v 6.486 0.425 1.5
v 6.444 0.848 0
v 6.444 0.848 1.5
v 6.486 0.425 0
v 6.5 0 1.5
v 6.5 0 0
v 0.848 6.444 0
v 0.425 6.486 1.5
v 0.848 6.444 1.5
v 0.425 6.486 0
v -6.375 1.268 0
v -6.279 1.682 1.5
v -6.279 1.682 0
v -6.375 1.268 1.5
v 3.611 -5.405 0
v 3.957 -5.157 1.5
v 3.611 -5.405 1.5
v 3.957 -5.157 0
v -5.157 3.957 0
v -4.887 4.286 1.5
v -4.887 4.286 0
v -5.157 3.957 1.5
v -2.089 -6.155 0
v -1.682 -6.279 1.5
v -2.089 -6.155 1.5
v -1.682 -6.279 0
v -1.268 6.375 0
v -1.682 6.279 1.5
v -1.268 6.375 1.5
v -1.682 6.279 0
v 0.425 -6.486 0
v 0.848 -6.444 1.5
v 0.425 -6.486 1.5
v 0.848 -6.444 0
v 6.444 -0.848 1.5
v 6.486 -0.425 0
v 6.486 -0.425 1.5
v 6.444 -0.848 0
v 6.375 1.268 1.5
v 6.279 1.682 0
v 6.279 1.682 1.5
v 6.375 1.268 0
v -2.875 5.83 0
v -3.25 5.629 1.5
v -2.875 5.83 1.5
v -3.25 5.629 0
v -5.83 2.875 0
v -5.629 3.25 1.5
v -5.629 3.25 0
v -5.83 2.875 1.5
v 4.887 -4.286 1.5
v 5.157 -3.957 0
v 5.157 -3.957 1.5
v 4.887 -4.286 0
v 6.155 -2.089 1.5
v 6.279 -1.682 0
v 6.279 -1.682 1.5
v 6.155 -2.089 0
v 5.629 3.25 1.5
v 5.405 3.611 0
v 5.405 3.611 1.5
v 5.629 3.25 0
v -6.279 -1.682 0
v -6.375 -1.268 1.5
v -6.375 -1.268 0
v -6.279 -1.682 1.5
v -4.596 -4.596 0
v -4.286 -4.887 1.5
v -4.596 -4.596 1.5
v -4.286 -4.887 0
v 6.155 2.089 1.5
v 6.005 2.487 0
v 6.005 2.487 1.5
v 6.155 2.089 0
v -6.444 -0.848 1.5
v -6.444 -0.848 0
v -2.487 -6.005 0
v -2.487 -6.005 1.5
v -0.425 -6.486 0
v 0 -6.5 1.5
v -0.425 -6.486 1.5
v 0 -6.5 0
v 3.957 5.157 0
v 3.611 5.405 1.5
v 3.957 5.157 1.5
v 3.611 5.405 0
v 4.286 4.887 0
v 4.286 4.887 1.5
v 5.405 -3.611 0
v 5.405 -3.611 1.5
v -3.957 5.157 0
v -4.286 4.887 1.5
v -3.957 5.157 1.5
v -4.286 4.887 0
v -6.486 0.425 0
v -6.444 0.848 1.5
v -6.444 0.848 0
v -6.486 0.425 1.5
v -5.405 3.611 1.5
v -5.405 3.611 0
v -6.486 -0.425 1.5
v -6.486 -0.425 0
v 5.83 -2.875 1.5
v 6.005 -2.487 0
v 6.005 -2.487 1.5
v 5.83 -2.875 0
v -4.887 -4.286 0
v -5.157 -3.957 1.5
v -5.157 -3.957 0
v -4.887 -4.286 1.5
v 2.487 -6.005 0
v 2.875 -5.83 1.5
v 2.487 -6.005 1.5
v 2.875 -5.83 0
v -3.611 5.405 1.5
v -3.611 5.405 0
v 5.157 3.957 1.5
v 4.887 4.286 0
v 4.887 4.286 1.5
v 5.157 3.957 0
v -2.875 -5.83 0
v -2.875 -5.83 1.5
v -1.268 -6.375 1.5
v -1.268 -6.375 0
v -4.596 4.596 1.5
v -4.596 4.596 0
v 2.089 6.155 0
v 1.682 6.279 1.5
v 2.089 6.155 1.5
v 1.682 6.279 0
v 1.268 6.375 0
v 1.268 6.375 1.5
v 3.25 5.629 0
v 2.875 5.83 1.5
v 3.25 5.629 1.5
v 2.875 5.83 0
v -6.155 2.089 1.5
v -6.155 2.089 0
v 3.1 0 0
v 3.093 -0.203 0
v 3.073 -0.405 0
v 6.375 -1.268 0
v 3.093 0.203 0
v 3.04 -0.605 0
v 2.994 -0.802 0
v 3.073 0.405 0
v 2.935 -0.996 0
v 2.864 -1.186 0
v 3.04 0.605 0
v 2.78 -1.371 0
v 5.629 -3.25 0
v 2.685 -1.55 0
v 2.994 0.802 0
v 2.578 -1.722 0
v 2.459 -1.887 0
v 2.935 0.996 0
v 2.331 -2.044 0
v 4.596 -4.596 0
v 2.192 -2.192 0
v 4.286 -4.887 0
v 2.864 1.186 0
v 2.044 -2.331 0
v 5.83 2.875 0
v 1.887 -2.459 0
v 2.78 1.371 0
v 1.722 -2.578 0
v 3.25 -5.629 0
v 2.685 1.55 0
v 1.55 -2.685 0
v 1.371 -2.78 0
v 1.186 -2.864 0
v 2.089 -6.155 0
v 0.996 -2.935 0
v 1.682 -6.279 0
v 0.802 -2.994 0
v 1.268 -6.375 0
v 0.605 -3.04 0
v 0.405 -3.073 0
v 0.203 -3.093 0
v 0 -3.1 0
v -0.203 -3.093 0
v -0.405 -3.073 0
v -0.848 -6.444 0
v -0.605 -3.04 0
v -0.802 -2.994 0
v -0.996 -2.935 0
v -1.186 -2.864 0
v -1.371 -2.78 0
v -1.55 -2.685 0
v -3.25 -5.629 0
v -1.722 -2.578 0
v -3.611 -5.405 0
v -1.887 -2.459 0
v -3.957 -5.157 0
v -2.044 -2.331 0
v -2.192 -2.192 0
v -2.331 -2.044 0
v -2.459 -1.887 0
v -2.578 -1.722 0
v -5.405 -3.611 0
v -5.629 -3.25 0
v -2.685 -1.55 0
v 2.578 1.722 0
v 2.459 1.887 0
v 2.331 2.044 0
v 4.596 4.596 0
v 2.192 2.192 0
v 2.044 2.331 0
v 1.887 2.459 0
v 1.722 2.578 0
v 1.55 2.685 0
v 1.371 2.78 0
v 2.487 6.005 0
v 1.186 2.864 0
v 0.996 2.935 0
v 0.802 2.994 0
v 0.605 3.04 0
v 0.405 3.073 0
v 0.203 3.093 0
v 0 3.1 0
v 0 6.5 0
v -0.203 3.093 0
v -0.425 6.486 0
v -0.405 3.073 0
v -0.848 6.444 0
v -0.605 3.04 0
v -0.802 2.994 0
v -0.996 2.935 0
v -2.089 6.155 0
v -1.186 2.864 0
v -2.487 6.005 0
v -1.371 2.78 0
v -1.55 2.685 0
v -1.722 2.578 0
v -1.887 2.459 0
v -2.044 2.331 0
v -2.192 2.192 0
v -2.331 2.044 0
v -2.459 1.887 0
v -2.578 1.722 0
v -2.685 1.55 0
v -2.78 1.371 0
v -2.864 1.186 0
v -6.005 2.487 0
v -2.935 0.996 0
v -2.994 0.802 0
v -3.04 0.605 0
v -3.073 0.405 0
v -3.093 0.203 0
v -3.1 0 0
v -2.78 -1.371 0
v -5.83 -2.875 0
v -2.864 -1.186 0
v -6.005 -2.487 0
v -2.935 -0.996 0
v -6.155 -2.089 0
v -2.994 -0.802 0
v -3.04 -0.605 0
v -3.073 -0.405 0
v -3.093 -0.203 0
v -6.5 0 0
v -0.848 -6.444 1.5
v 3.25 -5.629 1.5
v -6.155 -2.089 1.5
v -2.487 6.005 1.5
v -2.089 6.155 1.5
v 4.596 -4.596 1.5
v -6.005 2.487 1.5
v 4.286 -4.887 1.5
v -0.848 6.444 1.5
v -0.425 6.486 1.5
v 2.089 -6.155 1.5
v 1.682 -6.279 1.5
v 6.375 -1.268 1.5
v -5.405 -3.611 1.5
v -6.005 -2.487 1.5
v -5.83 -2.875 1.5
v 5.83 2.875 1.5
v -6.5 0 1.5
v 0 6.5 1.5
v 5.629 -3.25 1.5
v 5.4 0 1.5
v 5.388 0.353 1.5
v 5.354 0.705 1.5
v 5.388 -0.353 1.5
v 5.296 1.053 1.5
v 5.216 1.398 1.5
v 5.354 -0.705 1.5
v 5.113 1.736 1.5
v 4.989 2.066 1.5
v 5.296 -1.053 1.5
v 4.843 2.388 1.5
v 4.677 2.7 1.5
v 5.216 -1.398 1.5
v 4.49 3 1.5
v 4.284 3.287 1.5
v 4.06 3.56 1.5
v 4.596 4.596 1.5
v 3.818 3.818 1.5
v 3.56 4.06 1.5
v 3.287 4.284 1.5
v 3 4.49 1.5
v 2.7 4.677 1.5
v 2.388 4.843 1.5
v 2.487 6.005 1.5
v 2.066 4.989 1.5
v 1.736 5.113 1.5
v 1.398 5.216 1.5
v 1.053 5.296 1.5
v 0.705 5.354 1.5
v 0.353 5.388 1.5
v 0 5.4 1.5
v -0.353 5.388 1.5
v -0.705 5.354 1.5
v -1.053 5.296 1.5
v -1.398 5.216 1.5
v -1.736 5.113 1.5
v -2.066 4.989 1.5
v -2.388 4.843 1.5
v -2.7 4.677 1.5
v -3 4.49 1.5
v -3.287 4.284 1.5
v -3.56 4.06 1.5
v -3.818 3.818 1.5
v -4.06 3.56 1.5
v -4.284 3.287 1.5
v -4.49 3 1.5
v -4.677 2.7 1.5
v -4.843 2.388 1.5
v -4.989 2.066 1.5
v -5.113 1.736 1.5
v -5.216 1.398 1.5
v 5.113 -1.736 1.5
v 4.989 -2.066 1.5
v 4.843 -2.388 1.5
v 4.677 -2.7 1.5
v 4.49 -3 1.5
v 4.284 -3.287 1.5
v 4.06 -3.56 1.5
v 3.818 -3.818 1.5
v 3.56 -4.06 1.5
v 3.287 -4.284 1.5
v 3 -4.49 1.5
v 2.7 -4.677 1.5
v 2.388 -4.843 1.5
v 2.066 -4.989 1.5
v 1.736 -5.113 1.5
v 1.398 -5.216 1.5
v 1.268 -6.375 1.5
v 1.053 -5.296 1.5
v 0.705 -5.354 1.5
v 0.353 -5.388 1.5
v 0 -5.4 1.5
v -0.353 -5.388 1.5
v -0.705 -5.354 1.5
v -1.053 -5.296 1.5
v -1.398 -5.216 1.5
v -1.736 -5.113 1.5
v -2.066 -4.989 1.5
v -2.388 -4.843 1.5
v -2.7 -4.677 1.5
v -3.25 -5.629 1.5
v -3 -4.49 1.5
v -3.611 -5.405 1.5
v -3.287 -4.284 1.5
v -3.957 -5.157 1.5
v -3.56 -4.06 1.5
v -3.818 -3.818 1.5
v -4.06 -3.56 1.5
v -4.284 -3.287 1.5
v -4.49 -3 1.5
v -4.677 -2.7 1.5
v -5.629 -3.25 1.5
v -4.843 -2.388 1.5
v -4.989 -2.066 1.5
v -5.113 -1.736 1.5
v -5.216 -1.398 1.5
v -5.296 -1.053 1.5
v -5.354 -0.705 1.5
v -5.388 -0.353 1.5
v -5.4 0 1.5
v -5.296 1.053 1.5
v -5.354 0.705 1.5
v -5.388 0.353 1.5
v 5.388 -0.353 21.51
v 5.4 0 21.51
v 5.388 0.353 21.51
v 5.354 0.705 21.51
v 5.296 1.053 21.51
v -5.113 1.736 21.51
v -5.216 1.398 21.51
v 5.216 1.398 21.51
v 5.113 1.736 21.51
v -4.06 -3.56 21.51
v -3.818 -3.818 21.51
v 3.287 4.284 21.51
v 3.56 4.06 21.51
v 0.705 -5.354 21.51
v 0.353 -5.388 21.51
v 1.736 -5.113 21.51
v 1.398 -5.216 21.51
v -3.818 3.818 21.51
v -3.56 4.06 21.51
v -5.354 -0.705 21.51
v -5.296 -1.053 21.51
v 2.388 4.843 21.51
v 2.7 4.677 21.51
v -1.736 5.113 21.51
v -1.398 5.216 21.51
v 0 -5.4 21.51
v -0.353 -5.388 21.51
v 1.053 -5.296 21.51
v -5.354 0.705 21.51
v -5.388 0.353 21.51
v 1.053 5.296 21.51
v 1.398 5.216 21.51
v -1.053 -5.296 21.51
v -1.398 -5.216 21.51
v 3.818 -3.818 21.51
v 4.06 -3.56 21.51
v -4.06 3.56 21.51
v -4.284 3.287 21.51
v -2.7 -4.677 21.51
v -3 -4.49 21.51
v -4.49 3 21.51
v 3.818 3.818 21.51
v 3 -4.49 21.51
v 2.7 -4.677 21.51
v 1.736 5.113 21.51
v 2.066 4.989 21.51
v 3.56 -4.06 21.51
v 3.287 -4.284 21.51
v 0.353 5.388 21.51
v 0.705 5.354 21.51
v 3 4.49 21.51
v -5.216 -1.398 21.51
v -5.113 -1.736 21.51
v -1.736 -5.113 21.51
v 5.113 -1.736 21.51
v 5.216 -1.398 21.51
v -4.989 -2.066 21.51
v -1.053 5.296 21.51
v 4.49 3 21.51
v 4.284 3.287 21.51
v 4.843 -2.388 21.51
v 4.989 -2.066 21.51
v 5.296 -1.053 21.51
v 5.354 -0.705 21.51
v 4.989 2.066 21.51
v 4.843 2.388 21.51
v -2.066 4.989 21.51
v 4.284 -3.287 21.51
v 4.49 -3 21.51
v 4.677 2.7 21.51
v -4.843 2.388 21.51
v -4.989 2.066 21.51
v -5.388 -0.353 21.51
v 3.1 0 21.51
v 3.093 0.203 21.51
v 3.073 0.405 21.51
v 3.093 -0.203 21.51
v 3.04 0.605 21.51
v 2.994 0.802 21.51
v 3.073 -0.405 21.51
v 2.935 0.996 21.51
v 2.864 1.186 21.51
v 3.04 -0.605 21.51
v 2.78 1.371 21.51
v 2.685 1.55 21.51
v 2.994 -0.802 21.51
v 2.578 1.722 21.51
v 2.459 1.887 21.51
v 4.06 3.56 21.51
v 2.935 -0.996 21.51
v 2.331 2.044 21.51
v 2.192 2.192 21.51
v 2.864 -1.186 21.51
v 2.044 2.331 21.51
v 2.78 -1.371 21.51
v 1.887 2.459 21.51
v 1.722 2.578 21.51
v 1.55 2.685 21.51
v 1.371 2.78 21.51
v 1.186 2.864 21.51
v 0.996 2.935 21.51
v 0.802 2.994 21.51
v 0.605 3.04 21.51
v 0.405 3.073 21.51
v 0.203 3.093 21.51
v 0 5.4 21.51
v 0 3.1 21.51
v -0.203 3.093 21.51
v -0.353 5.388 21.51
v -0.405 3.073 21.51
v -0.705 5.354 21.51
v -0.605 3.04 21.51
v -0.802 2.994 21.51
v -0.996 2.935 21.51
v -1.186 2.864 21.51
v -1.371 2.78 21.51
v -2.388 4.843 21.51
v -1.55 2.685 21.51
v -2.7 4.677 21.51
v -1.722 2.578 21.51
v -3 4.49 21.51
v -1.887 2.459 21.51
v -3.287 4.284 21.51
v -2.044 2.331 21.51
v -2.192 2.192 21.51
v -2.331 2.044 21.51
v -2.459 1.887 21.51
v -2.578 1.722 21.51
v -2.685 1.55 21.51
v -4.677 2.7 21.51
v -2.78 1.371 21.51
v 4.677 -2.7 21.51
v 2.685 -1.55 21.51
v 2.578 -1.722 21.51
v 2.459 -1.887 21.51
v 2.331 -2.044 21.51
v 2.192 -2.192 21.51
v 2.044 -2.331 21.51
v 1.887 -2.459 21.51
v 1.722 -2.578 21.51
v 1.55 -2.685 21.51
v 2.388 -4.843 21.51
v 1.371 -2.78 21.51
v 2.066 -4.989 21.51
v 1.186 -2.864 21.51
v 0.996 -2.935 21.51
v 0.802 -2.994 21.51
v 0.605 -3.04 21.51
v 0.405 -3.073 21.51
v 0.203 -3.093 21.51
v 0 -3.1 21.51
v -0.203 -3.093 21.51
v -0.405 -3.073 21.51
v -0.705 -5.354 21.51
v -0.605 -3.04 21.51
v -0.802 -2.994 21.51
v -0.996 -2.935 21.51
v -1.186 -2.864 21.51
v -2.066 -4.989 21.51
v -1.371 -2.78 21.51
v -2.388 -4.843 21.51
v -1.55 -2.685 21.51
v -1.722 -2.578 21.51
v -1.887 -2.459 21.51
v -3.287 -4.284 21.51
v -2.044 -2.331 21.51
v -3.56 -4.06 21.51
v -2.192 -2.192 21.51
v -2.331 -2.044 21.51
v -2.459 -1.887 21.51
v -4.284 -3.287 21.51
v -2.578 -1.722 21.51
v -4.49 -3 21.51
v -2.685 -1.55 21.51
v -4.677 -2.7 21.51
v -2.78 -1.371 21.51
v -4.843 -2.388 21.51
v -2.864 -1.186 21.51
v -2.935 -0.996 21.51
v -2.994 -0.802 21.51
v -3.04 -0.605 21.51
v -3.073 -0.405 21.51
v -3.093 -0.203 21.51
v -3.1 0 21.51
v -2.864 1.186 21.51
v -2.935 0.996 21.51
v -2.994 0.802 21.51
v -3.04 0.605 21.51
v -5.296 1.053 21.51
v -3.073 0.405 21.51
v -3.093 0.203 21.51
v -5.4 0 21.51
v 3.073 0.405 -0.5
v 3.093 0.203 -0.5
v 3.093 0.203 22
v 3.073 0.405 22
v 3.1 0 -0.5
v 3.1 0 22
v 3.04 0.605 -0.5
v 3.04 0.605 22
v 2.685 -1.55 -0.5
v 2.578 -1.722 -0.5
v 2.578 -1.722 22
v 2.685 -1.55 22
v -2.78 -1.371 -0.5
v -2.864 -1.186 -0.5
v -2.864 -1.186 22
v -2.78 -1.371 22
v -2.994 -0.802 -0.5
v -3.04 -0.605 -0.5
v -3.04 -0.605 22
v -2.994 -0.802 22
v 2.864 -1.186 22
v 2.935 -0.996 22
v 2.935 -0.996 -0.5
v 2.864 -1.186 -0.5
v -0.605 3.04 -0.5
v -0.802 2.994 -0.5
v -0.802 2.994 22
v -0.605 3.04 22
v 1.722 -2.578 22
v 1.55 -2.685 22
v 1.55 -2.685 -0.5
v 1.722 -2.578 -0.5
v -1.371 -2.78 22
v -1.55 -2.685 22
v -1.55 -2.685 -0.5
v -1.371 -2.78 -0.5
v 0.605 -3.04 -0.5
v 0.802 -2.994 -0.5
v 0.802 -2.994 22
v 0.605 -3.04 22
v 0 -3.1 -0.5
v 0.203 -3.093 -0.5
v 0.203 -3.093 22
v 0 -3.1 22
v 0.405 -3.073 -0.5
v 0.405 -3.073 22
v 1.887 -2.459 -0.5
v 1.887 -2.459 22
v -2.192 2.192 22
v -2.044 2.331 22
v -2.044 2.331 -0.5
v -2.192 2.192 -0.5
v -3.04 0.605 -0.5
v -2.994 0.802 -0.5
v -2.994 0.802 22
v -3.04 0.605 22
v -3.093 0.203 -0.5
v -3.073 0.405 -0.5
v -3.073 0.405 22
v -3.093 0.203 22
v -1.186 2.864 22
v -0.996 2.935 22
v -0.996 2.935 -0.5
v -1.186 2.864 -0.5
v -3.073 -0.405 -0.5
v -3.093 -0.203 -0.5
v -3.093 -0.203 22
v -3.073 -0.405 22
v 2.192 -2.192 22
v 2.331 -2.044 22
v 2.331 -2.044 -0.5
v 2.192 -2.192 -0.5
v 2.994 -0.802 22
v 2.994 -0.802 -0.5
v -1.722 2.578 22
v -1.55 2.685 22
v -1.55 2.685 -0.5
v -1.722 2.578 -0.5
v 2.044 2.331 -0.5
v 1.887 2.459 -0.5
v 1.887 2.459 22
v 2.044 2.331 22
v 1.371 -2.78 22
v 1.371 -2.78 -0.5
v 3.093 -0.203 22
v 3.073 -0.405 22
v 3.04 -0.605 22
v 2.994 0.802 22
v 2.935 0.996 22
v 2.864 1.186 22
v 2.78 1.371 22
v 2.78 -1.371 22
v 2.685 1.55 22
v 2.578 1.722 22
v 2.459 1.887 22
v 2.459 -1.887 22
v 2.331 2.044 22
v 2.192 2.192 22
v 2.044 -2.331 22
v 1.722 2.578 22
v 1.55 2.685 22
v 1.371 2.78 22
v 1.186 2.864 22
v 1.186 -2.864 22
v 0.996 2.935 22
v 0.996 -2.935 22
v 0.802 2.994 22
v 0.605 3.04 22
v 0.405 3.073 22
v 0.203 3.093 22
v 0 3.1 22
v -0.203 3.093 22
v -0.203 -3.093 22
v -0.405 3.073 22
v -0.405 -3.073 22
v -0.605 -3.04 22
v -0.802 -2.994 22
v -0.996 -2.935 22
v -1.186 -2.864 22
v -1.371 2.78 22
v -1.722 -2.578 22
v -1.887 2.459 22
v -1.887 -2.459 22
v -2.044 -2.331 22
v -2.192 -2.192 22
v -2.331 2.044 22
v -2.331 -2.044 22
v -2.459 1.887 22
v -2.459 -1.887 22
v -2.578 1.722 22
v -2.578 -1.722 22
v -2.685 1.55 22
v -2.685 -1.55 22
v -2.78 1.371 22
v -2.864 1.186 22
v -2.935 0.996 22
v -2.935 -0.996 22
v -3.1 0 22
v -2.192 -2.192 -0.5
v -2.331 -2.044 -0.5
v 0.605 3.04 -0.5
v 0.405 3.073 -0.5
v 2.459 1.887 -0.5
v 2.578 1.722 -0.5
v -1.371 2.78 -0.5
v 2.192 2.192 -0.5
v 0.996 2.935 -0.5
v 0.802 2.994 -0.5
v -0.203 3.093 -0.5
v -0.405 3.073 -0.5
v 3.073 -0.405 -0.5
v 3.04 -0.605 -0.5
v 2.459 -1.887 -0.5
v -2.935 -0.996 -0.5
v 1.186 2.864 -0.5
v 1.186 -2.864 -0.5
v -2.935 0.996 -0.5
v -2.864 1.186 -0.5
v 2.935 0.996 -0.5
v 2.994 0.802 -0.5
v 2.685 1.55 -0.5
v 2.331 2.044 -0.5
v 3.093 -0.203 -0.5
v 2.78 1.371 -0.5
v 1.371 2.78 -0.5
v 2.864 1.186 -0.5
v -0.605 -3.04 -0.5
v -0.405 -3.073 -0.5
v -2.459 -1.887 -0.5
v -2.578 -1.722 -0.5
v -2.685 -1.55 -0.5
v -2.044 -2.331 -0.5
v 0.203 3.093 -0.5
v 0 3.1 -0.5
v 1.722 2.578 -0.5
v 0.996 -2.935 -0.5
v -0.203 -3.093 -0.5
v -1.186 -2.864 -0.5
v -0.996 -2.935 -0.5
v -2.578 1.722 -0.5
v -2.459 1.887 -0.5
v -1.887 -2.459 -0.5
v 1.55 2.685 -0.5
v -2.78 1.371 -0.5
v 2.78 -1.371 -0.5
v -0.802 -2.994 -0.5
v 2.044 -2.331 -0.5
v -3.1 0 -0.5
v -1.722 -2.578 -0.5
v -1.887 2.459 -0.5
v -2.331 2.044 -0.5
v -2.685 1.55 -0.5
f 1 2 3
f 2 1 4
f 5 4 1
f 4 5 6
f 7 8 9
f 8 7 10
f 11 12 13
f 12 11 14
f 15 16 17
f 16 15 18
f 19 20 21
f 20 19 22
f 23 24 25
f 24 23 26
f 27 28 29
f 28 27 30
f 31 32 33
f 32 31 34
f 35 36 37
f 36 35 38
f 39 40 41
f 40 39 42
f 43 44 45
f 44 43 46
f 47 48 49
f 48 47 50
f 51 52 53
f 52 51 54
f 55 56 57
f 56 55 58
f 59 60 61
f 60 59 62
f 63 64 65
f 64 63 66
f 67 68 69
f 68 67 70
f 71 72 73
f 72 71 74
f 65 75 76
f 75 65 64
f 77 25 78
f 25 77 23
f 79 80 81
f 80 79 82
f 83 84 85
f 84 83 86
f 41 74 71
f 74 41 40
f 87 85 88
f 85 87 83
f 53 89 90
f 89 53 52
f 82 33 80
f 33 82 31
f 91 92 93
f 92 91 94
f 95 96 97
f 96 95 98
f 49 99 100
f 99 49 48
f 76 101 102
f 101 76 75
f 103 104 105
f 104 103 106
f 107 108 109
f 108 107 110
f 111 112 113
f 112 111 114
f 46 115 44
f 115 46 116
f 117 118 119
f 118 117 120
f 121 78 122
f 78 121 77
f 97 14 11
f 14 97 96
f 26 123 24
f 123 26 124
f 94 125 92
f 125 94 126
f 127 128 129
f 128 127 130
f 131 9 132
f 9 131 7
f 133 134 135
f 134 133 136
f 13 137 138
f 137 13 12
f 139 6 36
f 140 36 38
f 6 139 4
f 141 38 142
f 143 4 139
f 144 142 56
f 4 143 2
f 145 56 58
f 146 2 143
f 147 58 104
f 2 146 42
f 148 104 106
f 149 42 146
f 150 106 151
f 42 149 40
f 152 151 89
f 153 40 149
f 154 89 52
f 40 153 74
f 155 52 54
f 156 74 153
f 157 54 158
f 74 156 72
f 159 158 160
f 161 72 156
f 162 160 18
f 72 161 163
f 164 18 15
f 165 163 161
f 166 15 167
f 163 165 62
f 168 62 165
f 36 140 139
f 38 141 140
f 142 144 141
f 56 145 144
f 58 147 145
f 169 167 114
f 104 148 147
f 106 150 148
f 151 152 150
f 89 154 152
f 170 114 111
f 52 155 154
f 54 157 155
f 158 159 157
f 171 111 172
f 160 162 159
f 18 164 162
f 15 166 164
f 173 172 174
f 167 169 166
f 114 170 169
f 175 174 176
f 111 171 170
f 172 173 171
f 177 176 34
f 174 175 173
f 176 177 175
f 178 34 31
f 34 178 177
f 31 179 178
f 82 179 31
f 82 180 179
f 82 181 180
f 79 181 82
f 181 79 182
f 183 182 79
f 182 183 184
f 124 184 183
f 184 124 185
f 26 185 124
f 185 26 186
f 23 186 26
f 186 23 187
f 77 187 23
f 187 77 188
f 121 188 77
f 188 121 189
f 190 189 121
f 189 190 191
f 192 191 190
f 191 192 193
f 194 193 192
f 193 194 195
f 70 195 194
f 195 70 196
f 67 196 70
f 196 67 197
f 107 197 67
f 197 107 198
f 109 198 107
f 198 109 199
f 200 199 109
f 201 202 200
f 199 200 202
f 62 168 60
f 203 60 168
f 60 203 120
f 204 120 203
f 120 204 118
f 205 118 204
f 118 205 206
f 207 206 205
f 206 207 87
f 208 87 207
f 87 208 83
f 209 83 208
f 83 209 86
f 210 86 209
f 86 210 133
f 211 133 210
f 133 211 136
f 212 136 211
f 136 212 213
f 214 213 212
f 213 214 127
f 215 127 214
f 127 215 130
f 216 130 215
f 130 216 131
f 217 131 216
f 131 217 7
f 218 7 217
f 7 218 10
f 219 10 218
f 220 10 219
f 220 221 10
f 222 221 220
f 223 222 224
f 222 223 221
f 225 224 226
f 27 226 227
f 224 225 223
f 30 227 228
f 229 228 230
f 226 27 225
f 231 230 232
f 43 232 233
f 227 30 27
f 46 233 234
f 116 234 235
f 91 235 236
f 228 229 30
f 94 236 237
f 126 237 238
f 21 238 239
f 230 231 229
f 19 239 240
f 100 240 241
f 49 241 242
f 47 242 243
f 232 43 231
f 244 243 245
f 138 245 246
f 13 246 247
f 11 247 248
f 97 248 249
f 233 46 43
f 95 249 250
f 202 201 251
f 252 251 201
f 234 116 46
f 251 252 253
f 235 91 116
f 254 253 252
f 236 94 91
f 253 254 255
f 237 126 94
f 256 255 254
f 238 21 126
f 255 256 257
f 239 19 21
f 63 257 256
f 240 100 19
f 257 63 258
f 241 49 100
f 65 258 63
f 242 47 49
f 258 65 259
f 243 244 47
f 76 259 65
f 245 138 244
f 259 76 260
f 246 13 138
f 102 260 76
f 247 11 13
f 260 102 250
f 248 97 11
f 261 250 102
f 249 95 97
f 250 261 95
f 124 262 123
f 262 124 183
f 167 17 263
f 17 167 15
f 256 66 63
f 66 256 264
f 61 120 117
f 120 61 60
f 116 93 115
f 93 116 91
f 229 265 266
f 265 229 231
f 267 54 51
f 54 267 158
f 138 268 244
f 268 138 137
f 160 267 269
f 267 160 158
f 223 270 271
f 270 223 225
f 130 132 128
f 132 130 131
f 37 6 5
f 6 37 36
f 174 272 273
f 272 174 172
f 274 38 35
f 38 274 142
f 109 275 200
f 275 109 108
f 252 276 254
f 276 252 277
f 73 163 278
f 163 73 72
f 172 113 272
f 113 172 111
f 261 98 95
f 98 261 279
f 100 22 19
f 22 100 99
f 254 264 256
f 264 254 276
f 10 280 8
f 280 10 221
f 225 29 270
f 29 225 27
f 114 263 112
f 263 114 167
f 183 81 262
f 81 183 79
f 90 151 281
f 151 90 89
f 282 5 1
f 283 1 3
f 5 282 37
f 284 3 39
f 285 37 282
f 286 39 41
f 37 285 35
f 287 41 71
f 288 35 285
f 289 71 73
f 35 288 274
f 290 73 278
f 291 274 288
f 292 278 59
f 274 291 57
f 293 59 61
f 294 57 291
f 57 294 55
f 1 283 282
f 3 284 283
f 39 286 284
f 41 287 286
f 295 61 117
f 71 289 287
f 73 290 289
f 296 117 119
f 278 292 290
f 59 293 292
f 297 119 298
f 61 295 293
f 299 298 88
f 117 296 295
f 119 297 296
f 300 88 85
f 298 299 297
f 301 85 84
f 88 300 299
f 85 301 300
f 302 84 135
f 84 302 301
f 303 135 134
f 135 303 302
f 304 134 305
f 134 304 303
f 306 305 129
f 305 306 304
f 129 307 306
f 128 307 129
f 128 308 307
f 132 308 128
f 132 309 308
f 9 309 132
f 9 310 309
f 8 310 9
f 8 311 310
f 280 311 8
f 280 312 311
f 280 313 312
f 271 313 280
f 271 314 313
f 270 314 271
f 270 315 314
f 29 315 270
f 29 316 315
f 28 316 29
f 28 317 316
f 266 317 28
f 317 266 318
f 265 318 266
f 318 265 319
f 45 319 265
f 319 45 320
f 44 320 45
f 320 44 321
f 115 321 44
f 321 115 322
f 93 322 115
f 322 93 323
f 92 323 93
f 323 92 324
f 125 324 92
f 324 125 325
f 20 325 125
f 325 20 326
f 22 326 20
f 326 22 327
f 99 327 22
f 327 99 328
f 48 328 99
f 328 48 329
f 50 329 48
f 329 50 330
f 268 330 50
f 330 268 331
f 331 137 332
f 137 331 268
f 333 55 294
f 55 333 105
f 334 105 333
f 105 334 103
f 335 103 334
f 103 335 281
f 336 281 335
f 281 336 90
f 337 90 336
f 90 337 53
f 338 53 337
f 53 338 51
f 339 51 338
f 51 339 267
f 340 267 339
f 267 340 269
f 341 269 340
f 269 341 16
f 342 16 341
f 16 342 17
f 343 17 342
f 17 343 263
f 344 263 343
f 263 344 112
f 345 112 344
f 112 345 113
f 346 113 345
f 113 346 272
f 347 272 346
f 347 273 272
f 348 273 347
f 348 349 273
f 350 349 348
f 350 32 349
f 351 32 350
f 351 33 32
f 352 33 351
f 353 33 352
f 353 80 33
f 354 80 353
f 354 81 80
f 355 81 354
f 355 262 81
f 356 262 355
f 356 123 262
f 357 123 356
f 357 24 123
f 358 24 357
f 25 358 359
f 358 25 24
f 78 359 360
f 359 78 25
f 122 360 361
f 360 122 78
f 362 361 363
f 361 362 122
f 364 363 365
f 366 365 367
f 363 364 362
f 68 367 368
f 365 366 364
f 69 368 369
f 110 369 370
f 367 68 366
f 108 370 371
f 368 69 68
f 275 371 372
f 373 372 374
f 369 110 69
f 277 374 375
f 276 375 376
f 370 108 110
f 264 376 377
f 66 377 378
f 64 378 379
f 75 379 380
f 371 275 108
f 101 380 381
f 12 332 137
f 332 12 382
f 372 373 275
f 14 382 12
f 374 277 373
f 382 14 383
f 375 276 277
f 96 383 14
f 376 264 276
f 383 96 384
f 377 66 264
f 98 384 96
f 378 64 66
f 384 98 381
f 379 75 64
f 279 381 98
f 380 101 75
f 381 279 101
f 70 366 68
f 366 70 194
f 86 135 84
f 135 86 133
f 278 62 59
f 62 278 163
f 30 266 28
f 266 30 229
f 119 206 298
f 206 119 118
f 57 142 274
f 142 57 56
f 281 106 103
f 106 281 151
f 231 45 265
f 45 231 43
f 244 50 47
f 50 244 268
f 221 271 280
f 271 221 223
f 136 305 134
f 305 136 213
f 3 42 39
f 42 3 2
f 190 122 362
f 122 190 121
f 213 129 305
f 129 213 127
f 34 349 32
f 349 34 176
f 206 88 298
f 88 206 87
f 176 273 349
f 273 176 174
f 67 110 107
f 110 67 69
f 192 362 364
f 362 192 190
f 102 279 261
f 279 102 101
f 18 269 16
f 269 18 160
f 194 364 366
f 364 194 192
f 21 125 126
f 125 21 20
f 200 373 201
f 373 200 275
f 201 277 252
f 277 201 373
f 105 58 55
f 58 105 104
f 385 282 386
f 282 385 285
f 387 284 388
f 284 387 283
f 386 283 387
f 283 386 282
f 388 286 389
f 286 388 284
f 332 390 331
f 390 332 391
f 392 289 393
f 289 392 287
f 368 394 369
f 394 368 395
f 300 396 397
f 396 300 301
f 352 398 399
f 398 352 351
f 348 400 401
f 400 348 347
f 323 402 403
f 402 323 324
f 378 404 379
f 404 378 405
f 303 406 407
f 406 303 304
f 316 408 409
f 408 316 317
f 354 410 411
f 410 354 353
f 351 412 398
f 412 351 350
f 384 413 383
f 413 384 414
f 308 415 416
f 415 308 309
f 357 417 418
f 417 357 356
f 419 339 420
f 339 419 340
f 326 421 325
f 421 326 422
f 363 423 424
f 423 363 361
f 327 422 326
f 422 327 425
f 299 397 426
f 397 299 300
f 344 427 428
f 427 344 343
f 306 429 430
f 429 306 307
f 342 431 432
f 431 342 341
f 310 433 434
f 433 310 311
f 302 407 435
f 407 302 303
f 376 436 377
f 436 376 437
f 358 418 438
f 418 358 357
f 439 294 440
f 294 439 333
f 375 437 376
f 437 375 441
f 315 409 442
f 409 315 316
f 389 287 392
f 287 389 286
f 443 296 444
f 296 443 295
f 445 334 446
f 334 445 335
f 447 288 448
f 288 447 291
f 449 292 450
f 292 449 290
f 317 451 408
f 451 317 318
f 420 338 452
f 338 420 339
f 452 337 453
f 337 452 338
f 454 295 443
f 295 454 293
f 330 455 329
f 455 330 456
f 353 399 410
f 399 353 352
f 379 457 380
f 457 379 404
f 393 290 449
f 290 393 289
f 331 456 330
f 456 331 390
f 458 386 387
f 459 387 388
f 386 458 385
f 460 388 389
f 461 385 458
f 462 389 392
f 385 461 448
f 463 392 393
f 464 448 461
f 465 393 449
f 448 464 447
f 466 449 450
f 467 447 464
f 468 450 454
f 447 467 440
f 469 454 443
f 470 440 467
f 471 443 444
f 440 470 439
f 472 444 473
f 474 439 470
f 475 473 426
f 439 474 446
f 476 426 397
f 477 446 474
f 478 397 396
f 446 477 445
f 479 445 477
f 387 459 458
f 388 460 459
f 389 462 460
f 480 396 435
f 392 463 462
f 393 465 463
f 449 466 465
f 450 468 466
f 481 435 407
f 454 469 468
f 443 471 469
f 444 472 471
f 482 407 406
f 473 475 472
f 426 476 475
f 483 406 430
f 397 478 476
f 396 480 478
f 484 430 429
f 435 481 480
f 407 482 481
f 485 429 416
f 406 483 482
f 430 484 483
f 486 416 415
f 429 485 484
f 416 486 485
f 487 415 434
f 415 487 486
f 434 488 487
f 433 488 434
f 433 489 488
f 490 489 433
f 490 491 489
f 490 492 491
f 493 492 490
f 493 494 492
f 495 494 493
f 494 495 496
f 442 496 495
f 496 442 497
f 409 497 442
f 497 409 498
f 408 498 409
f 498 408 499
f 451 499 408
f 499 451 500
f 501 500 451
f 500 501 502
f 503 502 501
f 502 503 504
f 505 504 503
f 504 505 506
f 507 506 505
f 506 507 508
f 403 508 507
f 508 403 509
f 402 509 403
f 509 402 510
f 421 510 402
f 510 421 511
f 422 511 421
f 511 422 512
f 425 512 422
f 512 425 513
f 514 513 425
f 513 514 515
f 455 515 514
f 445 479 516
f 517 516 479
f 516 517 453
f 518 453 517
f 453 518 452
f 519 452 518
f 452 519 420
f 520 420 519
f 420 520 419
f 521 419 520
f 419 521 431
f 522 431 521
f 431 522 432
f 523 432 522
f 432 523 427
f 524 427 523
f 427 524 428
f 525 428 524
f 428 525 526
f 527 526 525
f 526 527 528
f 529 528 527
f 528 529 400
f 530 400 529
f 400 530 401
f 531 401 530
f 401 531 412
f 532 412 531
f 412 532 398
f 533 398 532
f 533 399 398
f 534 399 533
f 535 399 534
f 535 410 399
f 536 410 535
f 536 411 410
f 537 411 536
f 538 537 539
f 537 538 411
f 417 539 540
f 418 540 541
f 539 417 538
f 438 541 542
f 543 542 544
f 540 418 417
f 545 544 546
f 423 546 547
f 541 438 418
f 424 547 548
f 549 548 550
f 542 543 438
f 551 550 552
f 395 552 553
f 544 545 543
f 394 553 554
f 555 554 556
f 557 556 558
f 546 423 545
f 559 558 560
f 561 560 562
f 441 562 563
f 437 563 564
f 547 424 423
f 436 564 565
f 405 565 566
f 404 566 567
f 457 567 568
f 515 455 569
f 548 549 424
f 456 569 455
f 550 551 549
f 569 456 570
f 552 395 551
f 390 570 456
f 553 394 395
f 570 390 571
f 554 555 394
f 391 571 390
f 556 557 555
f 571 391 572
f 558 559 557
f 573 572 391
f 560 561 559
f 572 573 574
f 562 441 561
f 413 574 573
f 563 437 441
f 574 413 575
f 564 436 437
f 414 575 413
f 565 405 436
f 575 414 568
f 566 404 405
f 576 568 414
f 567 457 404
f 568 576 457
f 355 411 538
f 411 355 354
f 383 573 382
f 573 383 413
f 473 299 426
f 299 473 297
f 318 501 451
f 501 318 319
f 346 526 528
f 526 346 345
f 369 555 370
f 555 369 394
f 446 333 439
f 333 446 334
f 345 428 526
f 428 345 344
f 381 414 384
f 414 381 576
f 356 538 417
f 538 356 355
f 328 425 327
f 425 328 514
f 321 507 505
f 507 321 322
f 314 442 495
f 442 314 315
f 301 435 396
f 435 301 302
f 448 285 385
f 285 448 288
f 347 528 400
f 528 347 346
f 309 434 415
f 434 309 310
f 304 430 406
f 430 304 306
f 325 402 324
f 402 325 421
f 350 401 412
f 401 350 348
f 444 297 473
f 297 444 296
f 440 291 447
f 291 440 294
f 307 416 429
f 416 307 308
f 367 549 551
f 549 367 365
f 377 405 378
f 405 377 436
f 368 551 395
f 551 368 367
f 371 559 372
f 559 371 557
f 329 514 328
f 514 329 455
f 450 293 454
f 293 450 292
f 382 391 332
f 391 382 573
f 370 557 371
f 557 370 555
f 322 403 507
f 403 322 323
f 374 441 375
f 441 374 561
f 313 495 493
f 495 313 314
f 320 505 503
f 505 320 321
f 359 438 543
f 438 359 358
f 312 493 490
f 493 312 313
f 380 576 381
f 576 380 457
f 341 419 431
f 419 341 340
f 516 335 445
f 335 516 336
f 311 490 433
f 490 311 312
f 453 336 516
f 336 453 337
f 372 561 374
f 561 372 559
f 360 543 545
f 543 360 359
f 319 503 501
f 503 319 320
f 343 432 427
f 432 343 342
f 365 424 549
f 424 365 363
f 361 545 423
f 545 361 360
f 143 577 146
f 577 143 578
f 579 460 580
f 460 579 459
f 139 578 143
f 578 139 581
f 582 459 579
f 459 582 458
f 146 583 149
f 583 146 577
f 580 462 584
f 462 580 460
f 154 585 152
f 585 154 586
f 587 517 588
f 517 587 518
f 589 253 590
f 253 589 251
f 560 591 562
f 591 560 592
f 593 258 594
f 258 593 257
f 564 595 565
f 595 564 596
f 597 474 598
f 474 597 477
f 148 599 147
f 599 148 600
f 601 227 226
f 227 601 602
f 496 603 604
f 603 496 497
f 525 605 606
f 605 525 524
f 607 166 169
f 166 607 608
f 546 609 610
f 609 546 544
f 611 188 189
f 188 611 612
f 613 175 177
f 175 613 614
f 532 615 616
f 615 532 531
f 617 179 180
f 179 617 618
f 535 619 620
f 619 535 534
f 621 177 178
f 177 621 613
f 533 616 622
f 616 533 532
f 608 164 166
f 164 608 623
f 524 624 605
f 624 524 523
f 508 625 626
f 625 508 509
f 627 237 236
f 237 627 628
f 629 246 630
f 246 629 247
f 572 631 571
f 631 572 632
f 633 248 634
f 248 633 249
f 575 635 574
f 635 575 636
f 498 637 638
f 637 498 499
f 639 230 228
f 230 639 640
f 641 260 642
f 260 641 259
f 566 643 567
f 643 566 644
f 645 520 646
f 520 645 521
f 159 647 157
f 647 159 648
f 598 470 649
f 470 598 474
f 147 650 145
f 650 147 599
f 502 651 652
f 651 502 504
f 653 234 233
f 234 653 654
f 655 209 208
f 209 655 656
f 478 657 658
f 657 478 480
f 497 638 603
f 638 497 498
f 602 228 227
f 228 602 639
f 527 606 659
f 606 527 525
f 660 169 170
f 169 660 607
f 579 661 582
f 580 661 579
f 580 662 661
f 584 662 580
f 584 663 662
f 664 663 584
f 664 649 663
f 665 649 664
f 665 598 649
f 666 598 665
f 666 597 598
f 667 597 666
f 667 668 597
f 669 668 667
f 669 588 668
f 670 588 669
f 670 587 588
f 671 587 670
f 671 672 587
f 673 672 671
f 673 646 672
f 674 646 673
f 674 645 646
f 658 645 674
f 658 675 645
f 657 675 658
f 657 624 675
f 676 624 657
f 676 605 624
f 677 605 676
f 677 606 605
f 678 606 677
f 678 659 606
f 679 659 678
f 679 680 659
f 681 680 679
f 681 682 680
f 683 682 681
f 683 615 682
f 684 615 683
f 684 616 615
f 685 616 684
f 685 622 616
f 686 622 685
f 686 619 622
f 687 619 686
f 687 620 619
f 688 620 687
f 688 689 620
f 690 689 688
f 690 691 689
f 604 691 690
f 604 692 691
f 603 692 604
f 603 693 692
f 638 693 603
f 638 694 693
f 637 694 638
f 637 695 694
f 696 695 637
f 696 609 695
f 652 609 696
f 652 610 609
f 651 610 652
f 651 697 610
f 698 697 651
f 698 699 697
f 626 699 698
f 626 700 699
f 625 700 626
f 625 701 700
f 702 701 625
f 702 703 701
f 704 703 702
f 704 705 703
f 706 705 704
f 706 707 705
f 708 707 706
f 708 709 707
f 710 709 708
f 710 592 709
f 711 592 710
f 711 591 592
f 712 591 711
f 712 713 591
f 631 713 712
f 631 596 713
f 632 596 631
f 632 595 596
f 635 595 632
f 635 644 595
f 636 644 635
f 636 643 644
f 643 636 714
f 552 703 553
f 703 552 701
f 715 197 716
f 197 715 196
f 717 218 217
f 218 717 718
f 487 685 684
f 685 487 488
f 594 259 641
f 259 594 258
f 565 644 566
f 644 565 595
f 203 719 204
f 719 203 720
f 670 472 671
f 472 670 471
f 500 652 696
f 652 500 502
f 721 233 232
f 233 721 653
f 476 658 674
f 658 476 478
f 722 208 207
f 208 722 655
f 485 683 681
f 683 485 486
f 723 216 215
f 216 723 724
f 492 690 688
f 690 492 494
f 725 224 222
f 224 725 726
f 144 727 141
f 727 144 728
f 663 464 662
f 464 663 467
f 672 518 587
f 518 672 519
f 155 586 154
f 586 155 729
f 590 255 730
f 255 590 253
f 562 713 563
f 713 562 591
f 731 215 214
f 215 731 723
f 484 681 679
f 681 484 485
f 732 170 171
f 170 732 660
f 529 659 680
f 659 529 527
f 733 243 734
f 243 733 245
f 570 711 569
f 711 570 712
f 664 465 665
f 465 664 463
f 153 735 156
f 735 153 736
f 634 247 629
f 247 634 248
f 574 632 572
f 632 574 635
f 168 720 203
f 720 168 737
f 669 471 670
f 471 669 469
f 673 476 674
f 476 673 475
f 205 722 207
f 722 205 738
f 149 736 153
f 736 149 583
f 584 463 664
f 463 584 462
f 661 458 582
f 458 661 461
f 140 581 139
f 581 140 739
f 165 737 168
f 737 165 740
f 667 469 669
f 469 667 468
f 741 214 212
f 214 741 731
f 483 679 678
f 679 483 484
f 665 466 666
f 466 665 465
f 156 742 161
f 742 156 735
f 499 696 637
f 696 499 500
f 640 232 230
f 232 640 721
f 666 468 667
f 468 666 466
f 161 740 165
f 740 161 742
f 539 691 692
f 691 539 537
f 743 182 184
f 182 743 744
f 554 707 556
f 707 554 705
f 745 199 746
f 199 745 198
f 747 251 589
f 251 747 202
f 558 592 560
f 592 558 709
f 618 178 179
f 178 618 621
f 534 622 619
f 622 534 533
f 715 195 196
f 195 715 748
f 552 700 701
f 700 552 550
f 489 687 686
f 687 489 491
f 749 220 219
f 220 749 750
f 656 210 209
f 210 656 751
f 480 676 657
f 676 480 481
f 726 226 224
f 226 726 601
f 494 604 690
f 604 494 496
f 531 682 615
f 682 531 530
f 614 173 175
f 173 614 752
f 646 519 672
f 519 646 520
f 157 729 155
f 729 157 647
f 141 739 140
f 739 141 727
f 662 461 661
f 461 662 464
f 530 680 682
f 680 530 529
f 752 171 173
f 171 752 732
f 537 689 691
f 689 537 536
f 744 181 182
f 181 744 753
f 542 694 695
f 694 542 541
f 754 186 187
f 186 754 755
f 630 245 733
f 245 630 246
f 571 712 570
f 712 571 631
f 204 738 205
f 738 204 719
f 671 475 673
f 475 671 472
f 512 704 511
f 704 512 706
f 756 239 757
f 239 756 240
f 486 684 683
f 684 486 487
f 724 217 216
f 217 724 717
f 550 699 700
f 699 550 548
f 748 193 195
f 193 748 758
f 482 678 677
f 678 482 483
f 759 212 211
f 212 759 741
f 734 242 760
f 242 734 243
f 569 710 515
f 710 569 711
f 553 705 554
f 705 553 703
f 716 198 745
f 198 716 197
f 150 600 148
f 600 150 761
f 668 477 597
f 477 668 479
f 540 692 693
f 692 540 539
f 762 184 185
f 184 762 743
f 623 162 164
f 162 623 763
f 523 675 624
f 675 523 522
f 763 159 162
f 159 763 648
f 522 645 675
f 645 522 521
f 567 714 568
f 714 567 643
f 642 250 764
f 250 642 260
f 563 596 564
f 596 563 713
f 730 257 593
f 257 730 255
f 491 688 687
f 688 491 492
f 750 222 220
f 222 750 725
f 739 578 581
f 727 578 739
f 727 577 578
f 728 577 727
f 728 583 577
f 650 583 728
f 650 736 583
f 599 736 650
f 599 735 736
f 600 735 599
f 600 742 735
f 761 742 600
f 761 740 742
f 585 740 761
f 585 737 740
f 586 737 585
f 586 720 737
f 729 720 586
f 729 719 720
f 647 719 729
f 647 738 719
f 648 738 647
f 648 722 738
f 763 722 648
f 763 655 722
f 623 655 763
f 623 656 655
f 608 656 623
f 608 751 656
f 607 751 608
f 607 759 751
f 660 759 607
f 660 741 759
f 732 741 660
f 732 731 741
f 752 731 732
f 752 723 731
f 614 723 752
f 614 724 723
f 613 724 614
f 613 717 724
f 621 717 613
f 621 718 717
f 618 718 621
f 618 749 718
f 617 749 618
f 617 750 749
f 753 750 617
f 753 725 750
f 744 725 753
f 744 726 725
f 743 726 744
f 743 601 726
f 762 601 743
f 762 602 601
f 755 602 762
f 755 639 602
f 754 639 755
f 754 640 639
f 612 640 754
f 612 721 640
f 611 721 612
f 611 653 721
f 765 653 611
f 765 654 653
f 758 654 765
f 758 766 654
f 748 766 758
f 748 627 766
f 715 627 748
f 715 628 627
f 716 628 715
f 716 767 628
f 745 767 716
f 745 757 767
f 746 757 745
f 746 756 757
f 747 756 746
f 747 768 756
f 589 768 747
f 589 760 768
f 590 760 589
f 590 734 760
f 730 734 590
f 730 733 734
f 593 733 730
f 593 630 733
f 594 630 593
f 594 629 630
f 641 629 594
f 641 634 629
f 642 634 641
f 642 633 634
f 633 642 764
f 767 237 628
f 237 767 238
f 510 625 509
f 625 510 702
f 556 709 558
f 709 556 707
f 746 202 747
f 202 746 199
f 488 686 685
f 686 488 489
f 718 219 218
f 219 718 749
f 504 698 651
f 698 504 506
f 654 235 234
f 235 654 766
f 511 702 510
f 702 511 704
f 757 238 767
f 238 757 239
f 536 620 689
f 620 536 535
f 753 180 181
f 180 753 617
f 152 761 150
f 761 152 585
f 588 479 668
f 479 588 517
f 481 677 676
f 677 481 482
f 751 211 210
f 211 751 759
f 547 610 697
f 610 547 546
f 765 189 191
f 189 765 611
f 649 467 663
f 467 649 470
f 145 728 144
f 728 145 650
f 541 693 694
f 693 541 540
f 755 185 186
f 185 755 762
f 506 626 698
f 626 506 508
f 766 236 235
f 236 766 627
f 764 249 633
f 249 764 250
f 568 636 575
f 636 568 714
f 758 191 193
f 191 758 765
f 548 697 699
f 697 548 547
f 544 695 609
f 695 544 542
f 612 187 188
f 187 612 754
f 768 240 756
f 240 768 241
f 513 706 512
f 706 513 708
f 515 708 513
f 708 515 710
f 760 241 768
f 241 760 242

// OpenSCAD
// PCR tube adapter sleeve: fits a 0.2 mL tube into a 1.5 mL tube rack hole
// Print orientation: collar on bed (z = 0), sleeve body builds upward (+Z)

// ---------------- Parameters ----------------
collar_d        = 13;     // collar outer diameter
collar_t        = 1.5;    // collar thickness (z = 0 to 1.5)
sleeve_d        = 10.8;   // sleeve body outer diameter
sleeve_h        = 20;     // sleeve body height (z = 1.5 to 21.5)
bore_d          = 6.2;    // through-bore diameter
eps             = 0.5;    // cutter overshoot past faces

$fn = 96;

// ---------------- Model ----------------
union() {
    // Collar
    cylinder(d = collar_d, h = collar_t);

    // Sleeve body (slightly overlapping the collar for a clean union)
    translate([0, 0, collar_t - 0.01])
        cylinder(d = sleeve_d, h = sleeve_h + 0.02);
}

// Through bore, open at both ends
translate([0, 0, -eps])
    cylinder(d = bore_d, h = collar_t + sleeve_h + 2 * eps);
